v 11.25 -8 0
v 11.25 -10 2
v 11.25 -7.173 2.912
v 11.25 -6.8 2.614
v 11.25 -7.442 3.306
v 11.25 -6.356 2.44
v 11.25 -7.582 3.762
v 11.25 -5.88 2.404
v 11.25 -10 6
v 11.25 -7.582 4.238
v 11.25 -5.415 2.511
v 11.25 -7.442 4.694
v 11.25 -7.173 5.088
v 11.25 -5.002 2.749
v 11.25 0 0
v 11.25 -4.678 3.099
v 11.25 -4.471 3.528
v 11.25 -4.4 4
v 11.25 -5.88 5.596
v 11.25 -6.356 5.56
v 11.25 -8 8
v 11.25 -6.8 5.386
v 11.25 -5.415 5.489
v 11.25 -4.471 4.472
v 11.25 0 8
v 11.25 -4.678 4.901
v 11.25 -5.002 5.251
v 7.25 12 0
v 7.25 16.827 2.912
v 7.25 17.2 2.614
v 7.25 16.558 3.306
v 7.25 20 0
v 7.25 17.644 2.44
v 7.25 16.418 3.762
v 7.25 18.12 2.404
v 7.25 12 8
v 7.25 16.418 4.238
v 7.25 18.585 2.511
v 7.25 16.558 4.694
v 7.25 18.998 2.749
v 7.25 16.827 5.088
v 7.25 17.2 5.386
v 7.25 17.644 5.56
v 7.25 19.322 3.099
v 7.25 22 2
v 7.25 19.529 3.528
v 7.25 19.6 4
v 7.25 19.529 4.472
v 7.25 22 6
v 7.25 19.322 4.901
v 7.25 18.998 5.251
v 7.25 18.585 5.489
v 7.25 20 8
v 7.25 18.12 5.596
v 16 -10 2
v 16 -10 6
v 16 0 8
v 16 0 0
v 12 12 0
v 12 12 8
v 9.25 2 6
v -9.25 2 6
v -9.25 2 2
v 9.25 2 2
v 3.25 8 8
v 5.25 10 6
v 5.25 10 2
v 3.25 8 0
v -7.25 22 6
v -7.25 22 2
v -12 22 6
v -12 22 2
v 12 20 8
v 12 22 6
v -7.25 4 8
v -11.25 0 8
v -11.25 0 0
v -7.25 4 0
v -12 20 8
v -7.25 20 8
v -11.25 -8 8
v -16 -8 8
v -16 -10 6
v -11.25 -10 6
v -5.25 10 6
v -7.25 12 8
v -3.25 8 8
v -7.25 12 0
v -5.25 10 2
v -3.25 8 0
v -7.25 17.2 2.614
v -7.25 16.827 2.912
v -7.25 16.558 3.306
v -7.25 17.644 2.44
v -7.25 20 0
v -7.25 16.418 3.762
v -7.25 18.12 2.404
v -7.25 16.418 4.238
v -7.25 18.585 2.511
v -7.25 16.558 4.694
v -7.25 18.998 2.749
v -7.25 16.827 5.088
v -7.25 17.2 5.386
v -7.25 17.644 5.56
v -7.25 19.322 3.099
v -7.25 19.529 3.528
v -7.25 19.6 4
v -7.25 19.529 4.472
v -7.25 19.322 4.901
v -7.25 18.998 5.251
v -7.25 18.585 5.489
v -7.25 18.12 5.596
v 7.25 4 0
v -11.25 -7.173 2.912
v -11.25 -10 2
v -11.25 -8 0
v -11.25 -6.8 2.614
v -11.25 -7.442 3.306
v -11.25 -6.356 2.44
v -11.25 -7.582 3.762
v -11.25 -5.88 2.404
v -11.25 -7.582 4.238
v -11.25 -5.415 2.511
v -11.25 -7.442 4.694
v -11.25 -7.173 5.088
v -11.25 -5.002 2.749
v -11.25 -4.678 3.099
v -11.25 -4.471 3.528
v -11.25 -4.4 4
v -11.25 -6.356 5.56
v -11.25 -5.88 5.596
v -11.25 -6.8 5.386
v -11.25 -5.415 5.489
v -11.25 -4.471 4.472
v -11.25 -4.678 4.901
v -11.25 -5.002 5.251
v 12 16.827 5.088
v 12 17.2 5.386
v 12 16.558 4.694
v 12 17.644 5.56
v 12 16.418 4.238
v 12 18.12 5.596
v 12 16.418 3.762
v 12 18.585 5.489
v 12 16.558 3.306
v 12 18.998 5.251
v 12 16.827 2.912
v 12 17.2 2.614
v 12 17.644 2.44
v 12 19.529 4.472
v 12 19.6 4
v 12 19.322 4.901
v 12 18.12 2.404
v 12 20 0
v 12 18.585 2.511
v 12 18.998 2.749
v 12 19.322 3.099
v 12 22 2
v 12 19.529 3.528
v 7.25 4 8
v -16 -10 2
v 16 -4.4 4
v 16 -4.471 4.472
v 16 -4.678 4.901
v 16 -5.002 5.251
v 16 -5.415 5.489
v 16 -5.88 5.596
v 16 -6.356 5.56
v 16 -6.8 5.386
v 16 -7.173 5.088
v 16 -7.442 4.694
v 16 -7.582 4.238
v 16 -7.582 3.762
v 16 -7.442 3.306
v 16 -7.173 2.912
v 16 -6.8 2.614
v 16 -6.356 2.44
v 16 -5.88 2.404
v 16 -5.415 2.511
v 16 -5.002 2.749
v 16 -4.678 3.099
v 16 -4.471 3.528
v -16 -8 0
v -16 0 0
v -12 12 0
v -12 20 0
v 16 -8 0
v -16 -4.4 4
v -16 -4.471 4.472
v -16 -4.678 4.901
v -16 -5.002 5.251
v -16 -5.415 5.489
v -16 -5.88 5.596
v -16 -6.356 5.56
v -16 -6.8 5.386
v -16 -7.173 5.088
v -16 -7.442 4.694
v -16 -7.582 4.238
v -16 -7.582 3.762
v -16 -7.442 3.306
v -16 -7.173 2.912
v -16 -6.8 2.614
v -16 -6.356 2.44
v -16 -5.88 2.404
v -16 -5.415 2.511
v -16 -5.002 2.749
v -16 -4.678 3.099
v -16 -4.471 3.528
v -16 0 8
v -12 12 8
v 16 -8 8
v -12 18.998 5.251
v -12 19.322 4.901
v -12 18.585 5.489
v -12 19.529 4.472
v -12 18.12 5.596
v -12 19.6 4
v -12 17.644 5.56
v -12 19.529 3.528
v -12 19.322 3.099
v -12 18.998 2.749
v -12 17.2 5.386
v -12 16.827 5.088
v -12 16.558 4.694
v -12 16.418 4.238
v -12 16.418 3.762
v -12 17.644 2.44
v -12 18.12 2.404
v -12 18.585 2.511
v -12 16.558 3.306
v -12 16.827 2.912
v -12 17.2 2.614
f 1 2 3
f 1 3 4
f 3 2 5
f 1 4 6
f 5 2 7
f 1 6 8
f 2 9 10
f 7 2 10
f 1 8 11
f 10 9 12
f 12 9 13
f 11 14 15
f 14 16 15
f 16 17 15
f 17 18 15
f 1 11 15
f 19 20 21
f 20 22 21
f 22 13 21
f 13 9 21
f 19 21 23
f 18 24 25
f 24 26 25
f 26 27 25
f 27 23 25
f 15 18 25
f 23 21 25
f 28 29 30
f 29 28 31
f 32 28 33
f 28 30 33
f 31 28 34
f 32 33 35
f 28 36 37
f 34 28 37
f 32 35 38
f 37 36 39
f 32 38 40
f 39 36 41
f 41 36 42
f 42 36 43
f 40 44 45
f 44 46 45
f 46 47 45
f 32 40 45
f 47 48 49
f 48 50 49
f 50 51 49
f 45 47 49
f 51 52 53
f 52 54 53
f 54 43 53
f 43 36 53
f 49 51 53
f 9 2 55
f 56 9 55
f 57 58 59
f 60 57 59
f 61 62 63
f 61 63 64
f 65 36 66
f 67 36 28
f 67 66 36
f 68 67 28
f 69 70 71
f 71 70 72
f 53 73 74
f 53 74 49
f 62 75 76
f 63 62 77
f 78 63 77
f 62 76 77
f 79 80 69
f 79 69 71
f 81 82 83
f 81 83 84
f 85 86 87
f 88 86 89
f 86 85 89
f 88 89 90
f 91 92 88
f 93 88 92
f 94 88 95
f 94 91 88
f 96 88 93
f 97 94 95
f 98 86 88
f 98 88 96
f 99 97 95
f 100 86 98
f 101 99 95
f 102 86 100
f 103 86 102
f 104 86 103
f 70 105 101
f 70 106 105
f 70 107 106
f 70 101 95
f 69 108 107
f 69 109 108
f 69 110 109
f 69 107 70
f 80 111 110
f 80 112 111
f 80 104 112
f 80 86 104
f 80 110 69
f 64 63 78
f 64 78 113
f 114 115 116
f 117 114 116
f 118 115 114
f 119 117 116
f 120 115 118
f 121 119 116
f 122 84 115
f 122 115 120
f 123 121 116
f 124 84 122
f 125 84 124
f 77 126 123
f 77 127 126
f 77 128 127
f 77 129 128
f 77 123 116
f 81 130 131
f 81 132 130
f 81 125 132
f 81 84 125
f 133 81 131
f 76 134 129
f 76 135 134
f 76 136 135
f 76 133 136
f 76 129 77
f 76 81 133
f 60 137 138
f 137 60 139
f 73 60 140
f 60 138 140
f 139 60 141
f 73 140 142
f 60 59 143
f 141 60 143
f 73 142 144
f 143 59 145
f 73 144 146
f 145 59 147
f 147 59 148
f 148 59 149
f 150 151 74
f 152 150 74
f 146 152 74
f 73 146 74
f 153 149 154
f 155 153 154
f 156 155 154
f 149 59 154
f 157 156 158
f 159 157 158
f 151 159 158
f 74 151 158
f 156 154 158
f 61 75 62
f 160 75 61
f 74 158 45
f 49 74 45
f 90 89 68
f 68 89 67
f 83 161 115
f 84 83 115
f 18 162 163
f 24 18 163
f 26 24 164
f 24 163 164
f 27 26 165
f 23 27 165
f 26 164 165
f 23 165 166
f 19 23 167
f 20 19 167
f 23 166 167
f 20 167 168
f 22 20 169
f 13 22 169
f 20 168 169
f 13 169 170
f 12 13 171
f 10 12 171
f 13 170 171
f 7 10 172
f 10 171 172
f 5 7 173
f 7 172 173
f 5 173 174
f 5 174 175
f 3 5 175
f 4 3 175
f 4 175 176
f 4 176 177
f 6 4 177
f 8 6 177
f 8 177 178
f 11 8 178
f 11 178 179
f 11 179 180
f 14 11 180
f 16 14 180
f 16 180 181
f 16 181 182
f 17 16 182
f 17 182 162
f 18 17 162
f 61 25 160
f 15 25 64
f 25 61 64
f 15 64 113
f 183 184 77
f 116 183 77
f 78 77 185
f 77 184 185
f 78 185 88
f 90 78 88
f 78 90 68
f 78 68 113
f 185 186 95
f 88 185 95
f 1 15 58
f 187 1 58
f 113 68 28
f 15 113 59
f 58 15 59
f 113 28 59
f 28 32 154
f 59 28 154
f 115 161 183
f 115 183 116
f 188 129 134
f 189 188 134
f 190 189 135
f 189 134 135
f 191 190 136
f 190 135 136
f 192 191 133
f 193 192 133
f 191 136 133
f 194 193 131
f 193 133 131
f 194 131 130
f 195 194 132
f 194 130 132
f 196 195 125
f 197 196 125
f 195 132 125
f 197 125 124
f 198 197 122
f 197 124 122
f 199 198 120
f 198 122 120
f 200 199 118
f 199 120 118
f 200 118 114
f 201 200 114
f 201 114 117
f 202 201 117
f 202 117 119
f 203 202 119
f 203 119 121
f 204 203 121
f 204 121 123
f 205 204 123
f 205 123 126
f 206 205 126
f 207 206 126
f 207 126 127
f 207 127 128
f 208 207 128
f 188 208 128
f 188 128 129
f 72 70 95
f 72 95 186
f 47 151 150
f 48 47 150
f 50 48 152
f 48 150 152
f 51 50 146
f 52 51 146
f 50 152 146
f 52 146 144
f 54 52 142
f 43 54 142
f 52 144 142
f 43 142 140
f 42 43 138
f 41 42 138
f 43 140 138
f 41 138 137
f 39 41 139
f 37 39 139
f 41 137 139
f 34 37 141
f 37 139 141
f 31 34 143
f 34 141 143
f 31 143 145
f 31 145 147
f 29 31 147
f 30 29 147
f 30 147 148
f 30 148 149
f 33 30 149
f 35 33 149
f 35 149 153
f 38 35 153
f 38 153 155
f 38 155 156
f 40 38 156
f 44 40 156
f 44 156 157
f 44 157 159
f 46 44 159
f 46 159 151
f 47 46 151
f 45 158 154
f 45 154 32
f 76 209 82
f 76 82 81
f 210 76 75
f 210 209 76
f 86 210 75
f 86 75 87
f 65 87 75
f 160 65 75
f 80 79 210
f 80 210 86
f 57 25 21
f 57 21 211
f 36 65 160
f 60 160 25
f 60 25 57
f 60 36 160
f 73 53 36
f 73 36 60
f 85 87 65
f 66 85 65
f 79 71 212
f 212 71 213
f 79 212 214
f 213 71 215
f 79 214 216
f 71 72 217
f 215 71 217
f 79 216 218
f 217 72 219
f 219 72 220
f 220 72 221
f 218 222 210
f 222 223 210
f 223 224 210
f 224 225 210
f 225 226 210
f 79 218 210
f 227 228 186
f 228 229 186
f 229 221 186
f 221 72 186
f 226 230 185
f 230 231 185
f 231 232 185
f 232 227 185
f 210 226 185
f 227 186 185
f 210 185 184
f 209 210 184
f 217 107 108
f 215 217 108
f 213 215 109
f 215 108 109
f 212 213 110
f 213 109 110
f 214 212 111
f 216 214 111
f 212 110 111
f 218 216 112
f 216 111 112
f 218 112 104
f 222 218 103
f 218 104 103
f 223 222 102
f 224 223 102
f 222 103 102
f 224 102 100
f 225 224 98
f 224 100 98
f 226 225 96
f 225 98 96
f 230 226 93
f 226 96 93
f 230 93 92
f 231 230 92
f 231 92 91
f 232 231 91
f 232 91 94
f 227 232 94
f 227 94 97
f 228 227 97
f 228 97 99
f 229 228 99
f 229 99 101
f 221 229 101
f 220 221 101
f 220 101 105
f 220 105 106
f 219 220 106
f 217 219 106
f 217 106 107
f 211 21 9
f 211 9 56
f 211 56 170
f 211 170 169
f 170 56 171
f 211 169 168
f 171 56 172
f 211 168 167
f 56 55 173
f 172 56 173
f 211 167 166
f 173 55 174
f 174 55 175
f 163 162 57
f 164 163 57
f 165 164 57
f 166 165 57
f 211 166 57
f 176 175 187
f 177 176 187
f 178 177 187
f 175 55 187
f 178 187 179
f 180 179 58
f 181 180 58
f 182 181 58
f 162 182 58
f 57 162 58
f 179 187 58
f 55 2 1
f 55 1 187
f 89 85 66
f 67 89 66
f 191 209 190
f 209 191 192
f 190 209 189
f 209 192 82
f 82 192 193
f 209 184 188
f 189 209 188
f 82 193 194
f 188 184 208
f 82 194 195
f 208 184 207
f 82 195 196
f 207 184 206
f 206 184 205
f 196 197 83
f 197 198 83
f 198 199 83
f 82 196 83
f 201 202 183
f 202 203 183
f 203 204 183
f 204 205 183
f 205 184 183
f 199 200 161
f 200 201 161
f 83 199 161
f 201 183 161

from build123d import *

# Parameters (mm, degrees)
F1_DEPTH = 8
F2_W     = 14.5
F2_H     = 12
F2_W_2   = 22.5
F3_DEPTH = 8
F4_R     = 1.6
F5_DEPTH = 32
F6_R     = 1.6
F7_DEPTH = 24
F8_SIZE  = 2
F9_SIZE  = 2


with BuildPart() as f1:
    # F0 (on Top) → F1 (new body)
    with BuildSketch(Plane.XY):
        Polygon((12, 22), (-12, 22), (-12, 12), (-16, 0), (-16, -10), (16, -10), (16, 0), (12, 12), align=None)
    extrude(amount=F1_DEPTH)

    # F2 (on face) → F3 (cut, through all)
    with BuildSketch(Plane.XY.offset(8)):
        with Locations((0, 16)):
            Rectangle(F2_W, F2_H)
        with Locations((0, -4)):
            Rectangle(F2_W_2, F2_H)
    extrude(amount=-F3_DEPTH, mode=Mode.SUBTRACT)

    # F4 (on face) → F5 (cut, through all)
    with BuildSketch(Plane.YZ.offset(16)):
        with Locations((-6, 4)):
            Circle(F4_R)
    extrude(amount=-F5_DEPTH, mode=Mode.SUBTRACT)

    # F6 (on face) → F7 (cut, through all)
    with BuildSketch(Plane.YZ.offset(12)):
        with Locations((18, 4)):
            Circle(F6_R)
    extrude(amount=-F7_DEPTH, mode=Mode.SUBTRACT)

    # F8
    f8_edges = [f1.edges().sort_by_distance(p)[0] for p in [
        (-11.25, 2, 4),
        (11.25, 2, 4),
        (-7.25, 10, 4),
        (7.25, 10, 4),
    ]]
    chamfer(f8_edges, length=F8_SIZE)

    # F9
    f9_edges = [f1.edges().sort_by_distance(p)[0] for p in [
        (-13.625, -10, 8),
        (-13.625, -10, 0),
        (0, 2, 8),
        (0, 2, 0),
        (13.625, -10, 8),
        (13.625, -10, 0),
        (9.625, 22, 8),
        (0, 10, 8),
        (0, 10, 0),
        (-9.625, 22, 8),
        (-9.625, 22, 0),
        (9.625, 22, 0),
    ]]
    chamfer(f9_edges, length=F9_SIZE)


solid = f1.part
